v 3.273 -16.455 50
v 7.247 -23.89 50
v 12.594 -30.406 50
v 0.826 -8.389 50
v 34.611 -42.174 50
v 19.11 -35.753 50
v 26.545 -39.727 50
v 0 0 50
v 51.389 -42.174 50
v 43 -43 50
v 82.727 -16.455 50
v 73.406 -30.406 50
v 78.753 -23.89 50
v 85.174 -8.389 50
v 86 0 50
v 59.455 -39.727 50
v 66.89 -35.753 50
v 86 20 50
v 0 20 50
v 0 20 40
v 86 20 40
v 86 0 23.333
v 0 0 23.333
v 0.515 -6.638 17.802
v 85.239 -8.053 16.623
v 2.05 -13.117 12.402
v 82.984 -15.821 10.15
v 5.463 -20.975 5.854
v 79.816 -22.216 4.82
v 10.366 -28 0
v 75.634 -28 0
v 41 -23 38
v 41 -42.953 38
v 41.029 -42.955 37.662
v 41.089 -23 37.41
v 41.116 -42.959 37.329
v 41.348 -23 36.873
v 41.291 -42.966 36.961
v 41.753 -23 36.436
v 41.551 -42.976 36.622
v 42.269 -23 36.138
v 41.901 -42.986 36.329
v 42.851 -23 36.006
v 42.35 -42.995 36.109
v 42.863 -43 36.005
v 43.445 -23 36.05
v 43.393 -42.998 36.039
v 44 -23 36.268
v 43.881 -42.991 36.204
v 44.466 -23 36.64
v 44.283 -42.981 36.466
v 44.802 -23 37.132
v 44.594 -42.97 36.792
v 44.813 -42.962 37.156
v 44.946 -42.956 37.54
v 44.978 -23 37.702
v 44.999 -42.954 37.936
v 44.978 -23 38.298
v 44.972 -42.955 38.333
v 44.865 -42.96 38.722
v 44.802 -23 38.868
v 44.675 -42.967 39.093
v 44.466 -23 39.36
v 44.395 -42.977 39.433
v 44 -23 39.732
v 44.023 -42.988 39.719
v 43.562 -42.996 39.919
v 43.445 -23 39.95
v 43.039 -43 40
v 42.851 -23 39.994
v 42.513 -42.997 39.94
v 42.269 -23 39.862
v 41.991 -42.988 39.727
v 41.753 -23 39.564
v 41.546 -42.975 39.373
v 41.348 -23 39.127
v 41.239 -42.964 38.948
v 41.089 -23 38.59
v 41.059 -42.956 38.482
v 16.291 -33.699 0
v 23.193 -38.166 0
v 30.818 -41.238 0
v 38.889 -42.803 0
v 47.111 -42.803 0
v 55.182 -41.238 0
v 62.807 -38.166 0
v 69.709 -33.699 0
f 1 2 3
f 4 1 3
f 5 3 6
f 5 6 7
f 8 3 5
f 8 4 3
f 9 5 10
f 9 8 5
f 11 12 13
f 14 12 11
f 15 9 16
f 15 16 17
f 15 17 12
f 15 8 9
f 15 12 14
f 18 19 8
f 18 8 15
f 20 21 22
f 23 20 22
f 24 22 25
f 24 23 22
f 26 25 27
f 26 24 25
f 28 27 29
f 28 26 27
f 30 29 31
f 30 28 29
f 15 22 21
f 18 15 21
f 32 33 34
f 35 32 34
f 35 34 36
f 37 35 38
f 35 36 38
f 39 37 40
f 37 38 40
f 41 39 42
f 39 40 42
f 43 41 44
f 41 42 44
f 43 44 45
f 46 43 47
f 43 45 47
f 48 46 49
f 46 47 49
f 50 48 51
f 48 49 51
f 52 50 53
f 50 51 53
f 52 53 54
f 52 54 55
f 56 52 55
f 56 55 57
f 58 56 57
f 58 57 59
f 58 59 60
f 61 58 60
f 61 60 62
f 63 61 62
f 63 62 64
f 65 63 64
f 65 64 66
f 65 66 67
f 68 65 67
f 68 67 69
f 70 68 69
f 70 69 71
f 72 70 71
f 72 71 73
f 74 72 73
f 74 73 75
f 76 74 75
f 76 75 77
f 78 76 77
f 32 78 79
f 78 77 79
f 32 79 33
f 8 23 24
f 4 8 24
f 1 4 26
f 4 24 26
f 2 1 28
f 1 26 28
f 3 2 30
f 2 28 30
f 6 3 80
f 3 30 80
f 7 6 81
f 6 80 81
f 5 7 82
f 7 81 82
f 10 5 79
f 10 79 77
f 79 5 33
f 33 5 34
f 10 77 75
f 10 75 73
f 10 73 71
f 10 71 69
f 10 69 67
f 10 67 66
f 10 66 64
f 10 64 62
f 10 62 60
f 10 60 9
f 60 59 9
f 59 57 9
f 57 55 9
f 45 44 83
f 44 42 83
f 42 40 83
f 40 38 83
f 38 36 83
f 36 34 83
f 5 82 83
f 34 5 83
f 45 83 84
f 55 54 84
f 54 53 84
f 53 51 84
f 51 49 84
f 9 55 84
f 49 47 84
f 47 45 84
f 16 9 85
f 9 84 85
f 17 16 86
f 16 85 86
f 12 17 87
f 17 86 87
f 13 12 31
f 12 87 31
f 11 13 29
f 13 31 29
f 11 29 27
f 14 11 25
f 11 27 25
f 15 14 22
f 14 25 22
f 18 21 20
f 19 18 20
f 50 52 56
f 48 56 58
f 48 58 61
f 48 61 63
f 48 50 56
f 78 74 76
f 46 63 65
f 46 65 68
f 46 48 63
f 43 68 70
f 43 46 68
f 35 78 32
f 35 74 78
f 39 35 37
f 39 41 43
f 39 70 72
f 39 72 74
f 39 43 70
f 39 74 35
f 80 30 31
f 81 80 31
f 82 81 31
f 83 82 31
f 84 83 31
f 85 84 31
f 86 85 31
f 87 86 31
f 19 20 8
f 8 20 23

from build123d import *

# Parameters (mm, degrees)
EXTRUDE_1_DEPTH          = 50
CUT_EXTRUDE_1_DEPTH      = 87
CUT_EXTRUDE_1_DEPTH_BACK = 1
SKETCH_3_R               = 2
CUT_EXTRUDE_2_DEPTH      = 20


with BuildPart() as part:
    # Эскиз1 → Бобышка-Вытянуть1 (new body)
    with BuildSketch(Plane.XY):
        with BuildLine():
            Line((0, 20), (0, 0))
            ThreePointArc((0, 0), (43, -43), (86, 0))
            Line((86, 0), (86, 20))
            Line((86, 20), (0, 20))
        make_face()
    extrude(amount=EXTRUDE_1_DEPTH)

    # Эскиз2 → Вырез-Вытянуть1 (cut, two sides)
    with BuildSketch(Plane(origin=(0, 0, 0), x_dir=(0, 0, -1), z_dir=(1, 0, 0))) as cut_extrude_1_sk:
        Polygon((-40, 20), (0, -28), (0, 20), align=None)
    extrude(amount=CUT_EXTRUDE_1_DEPTH, mode=Mode.SUBTRACT)
    extrude(cut_extrude_1_sk.sketch, amount=-CUT_EXTRUDE_1_DEPTH_BACK, mode=Mode.SUBTRACT)

    # Эскиз3 → Вырез-Вытянуть2 (cut)
    with BuildSketch(Plane(origin=(0, -43, 0), x_dir=(-1, 0, 0), z_dir=(0, -1, 0))):
        with Locations((-43, -38)):
            Circle(SKETCH_3_R)
    extrude(amount=-CUT_EXTRUDE_2_DEPTH, mode=Mode.SUBTRACT)


solid = part.part
